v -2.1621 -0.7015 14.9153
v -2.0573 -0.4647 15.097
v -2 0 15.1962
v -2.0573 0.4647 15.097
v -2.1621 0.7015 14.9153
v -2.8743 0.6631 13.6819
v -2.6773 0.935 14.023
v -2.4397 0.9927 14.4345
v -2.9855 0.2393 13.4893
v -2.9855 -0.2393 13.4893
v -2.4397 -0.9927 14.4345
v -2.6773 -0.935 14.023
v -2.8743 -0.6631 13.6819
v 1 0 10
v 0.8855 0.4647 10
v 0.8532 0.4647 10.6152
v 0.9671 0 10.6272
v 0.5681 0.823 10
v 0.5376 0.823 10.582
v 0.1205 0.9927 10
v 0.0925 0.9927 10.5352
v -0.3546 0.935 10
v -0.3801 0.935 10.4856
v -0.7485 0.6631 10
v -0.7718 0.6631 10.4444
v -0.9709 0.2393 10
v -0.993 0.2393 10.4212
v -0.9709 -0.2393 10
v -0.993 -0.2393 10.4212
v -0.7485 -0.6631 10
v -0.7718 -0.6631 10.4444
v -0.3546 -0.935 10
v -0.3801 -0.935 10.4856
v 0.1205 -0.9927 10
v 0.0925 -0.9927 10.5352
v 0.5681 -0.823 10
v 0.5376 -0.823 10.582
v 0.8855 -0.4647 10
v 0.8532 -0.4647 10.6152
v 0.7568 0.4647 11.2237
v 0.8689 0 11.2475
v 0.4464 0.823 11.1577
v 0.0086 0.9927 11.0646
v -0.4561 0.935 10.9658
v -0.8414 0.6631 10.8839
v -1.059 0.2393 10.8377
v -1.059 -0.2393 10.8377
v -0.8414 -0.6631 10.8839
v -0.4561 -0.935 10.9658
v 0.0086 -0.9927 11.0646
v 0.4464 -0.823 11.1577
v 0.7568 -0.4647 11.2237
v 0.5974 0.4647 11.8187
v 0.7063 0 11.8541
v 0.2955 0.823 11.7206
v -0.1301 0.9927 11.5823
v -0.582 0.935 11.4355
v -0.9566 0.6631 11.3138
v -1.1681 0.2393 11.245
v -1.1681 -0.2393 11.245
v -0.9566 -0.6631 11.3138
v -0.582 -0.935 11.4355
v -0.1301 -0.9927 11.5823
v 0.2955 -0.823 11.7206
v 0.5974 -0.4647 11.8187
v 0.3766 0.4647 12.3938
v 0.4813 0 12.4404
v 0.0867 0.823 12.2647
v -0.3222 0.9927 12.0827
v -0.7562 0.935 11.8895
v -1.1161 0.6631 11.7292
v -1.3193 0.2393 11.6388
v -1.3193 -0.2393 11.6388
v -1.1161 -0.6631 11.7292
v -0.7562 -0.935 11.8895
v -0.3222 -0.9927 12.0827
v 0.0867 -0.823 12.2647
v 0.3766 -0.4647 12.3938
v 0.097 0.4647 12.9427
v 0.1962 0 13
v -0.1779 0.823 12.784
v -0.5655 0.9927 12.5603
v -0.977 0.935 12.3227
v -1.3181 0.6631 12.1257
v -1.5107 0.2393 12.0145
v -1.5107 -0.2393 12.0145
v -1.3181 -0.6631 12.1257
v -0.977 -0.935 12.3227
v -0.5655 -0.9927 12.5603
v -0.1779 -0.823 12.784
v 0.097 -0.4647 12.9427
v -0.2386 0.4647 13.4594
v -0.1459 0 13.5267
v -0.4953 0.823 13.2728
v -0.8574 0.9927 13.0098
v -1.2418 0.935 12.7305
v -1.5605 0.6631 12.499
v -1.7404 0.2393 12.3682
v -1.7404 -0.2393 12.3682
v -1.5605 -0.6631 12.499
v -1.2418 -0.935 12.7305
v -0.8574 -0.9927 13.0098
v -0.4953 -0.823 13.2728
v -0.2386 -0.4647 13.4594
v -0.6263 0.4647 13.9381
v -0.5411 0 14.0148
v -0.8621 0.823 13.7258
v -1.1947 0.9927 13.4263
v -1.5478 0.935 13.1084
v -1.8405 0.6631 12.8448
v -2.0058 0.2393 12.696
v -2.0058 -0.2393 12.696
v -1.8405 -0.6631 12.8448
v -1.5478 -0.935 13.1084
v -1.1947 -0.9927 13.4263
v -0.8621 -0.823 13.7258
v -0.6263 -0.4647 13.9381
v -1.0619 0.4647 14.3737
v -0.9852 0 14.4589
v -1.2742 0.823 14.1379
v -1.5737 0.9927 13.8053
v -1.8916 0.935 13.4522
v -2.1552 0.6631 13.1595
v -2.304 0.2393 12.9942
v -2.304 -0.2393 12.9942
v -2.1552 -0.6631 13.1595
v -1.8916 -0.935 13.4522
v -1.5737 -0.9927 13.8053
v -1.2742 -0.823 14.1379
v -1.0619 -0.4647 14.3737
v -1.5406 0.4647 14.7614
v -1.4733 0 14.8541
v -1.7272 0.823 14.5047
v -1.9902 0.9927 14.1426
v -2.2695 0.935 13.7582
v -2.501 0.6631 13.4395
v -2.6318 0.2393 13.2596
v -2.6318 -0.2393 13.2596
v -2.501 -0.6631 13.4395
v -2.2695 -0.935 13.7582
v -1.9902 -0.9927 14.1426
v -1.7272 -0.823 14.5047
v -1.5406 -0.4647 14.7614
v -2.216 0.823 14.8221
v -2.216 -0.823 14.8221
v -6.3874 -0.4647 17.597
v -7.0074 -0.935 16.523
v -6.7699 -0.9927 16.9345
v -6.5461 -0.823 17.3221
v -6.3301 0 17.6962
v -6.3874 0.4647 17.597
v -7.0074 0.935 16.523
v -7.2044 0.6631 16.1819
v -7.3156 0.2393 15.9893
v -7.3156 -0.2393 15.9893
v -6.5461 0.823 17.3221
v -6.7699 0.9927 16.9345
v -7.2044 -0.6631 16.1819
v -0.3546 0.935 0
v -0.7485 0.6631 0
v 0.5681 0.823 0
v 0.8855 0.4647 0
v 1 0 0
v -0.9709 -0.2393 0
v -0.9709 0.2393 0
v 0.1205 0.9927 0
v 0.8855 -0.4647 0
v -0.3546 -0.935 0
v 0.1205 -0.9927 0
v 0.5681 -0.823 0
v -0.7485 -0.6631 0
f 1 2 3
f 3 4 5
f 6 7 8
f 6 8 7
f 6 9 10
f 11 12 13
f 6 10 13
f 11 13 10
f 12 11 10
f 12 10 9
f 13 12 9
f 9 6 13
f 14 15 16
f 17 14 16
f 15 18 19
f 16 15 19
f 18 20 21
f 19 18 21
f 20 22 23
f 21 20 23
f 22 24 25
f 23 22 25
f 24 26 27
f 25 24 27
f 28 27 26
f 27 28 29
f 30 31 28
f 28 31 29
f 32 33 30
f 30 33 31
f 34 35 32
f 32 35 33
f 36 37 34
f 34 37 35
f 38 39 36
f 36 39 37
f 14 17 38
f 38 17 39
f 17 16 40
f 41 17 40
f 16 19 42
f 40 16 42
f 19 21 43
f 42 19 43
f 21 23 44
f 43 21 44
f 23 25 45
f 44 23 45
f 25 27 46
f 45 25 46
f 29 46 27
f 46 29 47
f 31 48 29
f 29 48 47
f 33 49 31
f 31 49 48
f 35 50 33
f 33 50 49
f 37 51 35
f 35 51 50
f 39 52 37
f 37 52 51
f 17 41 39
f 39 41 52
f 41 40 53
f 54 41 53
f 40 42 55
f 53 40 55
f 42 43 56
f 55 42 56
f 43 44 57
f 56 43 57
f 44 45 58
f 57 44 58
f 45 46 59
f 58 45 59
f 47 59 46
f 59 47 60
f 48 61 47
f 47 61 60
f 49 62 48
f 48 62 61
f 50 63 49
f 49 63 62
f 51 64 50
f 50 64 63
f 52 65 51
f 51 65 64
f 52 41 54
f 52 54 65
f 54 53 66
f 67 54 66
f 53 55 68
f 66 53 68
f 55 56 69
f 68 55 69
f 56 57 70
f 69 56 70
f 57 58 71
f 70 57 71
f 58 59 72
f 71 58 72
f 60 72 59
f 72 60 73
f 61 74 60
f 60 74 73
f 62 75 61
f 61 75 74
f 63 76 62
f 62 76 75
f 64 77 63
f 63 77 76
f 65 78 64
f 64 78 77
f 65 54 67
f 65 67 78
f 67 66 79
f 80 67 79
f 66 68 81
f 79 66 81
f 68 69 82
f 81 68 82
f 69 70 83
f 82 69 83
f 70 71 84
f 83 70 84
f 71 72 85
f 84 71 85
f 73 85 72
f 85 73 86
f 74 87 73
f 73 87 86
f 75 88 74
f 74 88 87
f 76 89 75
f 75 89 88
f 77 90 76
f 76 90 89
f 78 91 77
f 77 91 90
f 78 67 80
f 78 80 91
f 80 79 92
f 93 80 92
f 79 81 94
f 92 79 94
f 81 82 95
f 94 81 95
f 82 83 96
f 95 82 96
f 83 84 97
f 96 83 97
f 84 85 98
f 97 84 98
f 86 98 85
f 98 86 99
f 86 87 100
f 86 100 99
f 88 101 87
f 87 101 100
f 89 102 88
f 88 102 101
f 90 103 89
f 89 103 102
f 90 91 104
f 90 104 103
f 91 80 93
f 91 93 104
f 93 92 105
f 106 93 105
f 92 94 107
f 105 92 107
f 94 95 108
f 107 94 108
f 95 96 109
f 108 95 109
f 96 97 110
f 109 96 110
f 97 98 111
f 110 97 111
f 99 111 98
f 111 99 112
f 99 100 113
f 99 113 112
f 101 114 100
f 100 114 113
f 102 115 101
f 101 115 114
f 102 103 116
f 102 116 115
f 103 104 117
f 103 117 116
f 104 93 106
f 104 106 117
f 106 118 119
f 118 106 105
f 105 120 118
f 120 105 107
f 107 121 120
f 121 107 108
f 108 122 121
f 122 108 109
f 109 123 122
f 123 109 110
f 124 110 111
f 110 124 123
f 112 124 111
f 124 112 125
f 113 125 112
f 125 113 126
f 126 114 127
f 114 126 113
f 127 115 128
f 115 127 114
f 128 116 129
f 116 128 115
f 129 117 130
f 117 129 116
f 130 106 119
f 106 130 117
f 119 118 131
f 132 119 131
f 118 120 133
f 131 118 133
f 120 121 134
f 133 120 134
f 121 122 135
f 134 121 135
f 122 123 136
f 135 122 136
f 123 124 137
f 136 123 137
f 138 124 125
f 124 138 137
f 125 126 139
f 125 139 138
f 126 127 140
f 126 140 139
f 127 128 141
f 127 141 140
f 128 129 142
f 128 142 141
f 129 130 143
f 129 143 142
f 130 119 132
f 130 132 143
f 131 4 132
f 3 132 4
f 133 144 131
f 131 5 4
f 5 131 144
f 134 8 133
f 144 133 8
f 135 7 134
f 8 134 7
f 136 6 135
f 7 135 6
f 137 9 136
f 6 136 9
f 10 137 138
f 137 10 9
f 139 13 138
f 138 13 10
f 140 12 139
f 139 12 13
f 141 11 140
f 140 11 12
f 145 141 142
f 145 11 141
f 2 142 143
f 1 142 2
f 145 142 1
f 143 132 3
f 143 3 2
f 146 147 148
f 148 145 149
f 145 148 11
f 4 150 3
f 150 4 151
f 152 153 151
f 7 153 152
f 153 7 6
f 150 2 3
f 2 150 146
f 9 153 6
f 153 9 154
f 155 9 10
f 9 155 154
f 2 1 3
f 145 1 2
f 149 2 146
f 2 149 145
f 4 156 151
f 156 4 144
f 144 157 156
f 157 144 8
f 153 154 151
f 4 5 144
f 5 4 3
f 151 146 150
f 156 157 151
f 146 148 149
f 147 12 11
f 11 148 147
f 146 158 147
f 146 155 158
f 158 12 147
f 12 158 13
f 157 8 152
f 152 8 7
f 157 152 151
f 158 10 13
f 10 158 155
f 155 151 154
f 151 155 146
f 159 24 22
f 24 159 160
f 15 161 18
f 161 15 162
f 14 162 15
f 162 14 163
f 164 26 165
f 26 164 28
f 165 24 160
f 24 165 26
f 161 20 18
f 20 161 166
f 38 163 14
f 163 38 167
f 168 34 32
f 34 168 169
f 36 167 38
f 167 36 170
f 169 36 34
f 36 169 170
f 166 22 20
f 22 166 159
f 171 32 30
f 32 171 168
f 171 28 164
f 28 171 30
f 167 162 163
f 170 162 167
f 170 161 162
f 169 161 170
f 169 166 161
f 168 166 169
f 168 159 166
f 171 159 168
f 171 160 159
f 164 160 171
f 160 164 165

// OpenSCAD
// file: ../slice.scad
eps = 0.1;

module cropboxes(r, deg, h=1) {
	degn = (deg % 360 > 0) ? deg % 360 : deg % 360 + 360;
	if (degn > 180)
		intersection_for(a = [0, 180 - degn])
			rotate(a) translate([-r, 0, -h/2]) cube([r*2, r*2, h]); 
	else
		for(a = [0, 180 - degn])
			rotate(a) translate([-r, 0, -h/2]) cube([r*2, r*2, h]); 
}

module cropsquares(r, deg) {
	degn = (deg % 360 > 0) ? deg % 360 : deg % 360 + 360;
	if (degn > 180)
		intersection_for(a = [0, 180 - degn])
			rotate(a) translate([-r, 0, 0]) square(r*2);
	else
		for(a = [0, 180 - degn])
			rotate(a) translate([-r, 0, 0]) square(r*2);
}

module slice(r = 10, deg = 30) {
	difference() {
		circle(r);
		cropsquares(r, deg);
	}
}

*slice(20, 190);

difference() {
	rotate_extrude(convexity=4) translate([10,0,0]) circle(r=3);
	cropboxes(13, 210, 6+eps);
}
// main file
use <../slice.scad>

$fa = 6;
$fs = 0.5;

module turn(rad_arc, rad_tube, angle) {
	rotate([-90,0,0])
	translate([-rad_arc,0,0])
	difference() {
		rotate_extrude(convexity=2)
			translate([rad_arc,0,0])
			circle(rad_tube);
		cropboxes(rad_arc + rad_tube, angle, 2*rad_tube);
	}
}

module straight(rad_tube, len) {
	cylinder(r=rad_tube, h=len);
}

module straightAnd(rad_tube, len) {
	union() {
		straight(rad_tube, len);
		translate([0,0,len]) child(0);
	}
}

// copy-paste of straightAnd. Argh.
module straightAnd2(rad_tube, len) {
	union() {
		straight(rad_tube, len);
		translate([0,0,len]) child(0);
	}
}

module turnAnd(rad_arc, rad_tube, angle) {
	union() {
		turn(rad_arc, rad_tube, angle);
		translate([-rad_arc,0,0])
		rotate([0,-angle,0])
		translate([rad_arc,0,0])
		child(0);
	}
}

straightAnd(1, 10)
turnAnd(5, 1, 60)
straightAnd2(1, 5);
